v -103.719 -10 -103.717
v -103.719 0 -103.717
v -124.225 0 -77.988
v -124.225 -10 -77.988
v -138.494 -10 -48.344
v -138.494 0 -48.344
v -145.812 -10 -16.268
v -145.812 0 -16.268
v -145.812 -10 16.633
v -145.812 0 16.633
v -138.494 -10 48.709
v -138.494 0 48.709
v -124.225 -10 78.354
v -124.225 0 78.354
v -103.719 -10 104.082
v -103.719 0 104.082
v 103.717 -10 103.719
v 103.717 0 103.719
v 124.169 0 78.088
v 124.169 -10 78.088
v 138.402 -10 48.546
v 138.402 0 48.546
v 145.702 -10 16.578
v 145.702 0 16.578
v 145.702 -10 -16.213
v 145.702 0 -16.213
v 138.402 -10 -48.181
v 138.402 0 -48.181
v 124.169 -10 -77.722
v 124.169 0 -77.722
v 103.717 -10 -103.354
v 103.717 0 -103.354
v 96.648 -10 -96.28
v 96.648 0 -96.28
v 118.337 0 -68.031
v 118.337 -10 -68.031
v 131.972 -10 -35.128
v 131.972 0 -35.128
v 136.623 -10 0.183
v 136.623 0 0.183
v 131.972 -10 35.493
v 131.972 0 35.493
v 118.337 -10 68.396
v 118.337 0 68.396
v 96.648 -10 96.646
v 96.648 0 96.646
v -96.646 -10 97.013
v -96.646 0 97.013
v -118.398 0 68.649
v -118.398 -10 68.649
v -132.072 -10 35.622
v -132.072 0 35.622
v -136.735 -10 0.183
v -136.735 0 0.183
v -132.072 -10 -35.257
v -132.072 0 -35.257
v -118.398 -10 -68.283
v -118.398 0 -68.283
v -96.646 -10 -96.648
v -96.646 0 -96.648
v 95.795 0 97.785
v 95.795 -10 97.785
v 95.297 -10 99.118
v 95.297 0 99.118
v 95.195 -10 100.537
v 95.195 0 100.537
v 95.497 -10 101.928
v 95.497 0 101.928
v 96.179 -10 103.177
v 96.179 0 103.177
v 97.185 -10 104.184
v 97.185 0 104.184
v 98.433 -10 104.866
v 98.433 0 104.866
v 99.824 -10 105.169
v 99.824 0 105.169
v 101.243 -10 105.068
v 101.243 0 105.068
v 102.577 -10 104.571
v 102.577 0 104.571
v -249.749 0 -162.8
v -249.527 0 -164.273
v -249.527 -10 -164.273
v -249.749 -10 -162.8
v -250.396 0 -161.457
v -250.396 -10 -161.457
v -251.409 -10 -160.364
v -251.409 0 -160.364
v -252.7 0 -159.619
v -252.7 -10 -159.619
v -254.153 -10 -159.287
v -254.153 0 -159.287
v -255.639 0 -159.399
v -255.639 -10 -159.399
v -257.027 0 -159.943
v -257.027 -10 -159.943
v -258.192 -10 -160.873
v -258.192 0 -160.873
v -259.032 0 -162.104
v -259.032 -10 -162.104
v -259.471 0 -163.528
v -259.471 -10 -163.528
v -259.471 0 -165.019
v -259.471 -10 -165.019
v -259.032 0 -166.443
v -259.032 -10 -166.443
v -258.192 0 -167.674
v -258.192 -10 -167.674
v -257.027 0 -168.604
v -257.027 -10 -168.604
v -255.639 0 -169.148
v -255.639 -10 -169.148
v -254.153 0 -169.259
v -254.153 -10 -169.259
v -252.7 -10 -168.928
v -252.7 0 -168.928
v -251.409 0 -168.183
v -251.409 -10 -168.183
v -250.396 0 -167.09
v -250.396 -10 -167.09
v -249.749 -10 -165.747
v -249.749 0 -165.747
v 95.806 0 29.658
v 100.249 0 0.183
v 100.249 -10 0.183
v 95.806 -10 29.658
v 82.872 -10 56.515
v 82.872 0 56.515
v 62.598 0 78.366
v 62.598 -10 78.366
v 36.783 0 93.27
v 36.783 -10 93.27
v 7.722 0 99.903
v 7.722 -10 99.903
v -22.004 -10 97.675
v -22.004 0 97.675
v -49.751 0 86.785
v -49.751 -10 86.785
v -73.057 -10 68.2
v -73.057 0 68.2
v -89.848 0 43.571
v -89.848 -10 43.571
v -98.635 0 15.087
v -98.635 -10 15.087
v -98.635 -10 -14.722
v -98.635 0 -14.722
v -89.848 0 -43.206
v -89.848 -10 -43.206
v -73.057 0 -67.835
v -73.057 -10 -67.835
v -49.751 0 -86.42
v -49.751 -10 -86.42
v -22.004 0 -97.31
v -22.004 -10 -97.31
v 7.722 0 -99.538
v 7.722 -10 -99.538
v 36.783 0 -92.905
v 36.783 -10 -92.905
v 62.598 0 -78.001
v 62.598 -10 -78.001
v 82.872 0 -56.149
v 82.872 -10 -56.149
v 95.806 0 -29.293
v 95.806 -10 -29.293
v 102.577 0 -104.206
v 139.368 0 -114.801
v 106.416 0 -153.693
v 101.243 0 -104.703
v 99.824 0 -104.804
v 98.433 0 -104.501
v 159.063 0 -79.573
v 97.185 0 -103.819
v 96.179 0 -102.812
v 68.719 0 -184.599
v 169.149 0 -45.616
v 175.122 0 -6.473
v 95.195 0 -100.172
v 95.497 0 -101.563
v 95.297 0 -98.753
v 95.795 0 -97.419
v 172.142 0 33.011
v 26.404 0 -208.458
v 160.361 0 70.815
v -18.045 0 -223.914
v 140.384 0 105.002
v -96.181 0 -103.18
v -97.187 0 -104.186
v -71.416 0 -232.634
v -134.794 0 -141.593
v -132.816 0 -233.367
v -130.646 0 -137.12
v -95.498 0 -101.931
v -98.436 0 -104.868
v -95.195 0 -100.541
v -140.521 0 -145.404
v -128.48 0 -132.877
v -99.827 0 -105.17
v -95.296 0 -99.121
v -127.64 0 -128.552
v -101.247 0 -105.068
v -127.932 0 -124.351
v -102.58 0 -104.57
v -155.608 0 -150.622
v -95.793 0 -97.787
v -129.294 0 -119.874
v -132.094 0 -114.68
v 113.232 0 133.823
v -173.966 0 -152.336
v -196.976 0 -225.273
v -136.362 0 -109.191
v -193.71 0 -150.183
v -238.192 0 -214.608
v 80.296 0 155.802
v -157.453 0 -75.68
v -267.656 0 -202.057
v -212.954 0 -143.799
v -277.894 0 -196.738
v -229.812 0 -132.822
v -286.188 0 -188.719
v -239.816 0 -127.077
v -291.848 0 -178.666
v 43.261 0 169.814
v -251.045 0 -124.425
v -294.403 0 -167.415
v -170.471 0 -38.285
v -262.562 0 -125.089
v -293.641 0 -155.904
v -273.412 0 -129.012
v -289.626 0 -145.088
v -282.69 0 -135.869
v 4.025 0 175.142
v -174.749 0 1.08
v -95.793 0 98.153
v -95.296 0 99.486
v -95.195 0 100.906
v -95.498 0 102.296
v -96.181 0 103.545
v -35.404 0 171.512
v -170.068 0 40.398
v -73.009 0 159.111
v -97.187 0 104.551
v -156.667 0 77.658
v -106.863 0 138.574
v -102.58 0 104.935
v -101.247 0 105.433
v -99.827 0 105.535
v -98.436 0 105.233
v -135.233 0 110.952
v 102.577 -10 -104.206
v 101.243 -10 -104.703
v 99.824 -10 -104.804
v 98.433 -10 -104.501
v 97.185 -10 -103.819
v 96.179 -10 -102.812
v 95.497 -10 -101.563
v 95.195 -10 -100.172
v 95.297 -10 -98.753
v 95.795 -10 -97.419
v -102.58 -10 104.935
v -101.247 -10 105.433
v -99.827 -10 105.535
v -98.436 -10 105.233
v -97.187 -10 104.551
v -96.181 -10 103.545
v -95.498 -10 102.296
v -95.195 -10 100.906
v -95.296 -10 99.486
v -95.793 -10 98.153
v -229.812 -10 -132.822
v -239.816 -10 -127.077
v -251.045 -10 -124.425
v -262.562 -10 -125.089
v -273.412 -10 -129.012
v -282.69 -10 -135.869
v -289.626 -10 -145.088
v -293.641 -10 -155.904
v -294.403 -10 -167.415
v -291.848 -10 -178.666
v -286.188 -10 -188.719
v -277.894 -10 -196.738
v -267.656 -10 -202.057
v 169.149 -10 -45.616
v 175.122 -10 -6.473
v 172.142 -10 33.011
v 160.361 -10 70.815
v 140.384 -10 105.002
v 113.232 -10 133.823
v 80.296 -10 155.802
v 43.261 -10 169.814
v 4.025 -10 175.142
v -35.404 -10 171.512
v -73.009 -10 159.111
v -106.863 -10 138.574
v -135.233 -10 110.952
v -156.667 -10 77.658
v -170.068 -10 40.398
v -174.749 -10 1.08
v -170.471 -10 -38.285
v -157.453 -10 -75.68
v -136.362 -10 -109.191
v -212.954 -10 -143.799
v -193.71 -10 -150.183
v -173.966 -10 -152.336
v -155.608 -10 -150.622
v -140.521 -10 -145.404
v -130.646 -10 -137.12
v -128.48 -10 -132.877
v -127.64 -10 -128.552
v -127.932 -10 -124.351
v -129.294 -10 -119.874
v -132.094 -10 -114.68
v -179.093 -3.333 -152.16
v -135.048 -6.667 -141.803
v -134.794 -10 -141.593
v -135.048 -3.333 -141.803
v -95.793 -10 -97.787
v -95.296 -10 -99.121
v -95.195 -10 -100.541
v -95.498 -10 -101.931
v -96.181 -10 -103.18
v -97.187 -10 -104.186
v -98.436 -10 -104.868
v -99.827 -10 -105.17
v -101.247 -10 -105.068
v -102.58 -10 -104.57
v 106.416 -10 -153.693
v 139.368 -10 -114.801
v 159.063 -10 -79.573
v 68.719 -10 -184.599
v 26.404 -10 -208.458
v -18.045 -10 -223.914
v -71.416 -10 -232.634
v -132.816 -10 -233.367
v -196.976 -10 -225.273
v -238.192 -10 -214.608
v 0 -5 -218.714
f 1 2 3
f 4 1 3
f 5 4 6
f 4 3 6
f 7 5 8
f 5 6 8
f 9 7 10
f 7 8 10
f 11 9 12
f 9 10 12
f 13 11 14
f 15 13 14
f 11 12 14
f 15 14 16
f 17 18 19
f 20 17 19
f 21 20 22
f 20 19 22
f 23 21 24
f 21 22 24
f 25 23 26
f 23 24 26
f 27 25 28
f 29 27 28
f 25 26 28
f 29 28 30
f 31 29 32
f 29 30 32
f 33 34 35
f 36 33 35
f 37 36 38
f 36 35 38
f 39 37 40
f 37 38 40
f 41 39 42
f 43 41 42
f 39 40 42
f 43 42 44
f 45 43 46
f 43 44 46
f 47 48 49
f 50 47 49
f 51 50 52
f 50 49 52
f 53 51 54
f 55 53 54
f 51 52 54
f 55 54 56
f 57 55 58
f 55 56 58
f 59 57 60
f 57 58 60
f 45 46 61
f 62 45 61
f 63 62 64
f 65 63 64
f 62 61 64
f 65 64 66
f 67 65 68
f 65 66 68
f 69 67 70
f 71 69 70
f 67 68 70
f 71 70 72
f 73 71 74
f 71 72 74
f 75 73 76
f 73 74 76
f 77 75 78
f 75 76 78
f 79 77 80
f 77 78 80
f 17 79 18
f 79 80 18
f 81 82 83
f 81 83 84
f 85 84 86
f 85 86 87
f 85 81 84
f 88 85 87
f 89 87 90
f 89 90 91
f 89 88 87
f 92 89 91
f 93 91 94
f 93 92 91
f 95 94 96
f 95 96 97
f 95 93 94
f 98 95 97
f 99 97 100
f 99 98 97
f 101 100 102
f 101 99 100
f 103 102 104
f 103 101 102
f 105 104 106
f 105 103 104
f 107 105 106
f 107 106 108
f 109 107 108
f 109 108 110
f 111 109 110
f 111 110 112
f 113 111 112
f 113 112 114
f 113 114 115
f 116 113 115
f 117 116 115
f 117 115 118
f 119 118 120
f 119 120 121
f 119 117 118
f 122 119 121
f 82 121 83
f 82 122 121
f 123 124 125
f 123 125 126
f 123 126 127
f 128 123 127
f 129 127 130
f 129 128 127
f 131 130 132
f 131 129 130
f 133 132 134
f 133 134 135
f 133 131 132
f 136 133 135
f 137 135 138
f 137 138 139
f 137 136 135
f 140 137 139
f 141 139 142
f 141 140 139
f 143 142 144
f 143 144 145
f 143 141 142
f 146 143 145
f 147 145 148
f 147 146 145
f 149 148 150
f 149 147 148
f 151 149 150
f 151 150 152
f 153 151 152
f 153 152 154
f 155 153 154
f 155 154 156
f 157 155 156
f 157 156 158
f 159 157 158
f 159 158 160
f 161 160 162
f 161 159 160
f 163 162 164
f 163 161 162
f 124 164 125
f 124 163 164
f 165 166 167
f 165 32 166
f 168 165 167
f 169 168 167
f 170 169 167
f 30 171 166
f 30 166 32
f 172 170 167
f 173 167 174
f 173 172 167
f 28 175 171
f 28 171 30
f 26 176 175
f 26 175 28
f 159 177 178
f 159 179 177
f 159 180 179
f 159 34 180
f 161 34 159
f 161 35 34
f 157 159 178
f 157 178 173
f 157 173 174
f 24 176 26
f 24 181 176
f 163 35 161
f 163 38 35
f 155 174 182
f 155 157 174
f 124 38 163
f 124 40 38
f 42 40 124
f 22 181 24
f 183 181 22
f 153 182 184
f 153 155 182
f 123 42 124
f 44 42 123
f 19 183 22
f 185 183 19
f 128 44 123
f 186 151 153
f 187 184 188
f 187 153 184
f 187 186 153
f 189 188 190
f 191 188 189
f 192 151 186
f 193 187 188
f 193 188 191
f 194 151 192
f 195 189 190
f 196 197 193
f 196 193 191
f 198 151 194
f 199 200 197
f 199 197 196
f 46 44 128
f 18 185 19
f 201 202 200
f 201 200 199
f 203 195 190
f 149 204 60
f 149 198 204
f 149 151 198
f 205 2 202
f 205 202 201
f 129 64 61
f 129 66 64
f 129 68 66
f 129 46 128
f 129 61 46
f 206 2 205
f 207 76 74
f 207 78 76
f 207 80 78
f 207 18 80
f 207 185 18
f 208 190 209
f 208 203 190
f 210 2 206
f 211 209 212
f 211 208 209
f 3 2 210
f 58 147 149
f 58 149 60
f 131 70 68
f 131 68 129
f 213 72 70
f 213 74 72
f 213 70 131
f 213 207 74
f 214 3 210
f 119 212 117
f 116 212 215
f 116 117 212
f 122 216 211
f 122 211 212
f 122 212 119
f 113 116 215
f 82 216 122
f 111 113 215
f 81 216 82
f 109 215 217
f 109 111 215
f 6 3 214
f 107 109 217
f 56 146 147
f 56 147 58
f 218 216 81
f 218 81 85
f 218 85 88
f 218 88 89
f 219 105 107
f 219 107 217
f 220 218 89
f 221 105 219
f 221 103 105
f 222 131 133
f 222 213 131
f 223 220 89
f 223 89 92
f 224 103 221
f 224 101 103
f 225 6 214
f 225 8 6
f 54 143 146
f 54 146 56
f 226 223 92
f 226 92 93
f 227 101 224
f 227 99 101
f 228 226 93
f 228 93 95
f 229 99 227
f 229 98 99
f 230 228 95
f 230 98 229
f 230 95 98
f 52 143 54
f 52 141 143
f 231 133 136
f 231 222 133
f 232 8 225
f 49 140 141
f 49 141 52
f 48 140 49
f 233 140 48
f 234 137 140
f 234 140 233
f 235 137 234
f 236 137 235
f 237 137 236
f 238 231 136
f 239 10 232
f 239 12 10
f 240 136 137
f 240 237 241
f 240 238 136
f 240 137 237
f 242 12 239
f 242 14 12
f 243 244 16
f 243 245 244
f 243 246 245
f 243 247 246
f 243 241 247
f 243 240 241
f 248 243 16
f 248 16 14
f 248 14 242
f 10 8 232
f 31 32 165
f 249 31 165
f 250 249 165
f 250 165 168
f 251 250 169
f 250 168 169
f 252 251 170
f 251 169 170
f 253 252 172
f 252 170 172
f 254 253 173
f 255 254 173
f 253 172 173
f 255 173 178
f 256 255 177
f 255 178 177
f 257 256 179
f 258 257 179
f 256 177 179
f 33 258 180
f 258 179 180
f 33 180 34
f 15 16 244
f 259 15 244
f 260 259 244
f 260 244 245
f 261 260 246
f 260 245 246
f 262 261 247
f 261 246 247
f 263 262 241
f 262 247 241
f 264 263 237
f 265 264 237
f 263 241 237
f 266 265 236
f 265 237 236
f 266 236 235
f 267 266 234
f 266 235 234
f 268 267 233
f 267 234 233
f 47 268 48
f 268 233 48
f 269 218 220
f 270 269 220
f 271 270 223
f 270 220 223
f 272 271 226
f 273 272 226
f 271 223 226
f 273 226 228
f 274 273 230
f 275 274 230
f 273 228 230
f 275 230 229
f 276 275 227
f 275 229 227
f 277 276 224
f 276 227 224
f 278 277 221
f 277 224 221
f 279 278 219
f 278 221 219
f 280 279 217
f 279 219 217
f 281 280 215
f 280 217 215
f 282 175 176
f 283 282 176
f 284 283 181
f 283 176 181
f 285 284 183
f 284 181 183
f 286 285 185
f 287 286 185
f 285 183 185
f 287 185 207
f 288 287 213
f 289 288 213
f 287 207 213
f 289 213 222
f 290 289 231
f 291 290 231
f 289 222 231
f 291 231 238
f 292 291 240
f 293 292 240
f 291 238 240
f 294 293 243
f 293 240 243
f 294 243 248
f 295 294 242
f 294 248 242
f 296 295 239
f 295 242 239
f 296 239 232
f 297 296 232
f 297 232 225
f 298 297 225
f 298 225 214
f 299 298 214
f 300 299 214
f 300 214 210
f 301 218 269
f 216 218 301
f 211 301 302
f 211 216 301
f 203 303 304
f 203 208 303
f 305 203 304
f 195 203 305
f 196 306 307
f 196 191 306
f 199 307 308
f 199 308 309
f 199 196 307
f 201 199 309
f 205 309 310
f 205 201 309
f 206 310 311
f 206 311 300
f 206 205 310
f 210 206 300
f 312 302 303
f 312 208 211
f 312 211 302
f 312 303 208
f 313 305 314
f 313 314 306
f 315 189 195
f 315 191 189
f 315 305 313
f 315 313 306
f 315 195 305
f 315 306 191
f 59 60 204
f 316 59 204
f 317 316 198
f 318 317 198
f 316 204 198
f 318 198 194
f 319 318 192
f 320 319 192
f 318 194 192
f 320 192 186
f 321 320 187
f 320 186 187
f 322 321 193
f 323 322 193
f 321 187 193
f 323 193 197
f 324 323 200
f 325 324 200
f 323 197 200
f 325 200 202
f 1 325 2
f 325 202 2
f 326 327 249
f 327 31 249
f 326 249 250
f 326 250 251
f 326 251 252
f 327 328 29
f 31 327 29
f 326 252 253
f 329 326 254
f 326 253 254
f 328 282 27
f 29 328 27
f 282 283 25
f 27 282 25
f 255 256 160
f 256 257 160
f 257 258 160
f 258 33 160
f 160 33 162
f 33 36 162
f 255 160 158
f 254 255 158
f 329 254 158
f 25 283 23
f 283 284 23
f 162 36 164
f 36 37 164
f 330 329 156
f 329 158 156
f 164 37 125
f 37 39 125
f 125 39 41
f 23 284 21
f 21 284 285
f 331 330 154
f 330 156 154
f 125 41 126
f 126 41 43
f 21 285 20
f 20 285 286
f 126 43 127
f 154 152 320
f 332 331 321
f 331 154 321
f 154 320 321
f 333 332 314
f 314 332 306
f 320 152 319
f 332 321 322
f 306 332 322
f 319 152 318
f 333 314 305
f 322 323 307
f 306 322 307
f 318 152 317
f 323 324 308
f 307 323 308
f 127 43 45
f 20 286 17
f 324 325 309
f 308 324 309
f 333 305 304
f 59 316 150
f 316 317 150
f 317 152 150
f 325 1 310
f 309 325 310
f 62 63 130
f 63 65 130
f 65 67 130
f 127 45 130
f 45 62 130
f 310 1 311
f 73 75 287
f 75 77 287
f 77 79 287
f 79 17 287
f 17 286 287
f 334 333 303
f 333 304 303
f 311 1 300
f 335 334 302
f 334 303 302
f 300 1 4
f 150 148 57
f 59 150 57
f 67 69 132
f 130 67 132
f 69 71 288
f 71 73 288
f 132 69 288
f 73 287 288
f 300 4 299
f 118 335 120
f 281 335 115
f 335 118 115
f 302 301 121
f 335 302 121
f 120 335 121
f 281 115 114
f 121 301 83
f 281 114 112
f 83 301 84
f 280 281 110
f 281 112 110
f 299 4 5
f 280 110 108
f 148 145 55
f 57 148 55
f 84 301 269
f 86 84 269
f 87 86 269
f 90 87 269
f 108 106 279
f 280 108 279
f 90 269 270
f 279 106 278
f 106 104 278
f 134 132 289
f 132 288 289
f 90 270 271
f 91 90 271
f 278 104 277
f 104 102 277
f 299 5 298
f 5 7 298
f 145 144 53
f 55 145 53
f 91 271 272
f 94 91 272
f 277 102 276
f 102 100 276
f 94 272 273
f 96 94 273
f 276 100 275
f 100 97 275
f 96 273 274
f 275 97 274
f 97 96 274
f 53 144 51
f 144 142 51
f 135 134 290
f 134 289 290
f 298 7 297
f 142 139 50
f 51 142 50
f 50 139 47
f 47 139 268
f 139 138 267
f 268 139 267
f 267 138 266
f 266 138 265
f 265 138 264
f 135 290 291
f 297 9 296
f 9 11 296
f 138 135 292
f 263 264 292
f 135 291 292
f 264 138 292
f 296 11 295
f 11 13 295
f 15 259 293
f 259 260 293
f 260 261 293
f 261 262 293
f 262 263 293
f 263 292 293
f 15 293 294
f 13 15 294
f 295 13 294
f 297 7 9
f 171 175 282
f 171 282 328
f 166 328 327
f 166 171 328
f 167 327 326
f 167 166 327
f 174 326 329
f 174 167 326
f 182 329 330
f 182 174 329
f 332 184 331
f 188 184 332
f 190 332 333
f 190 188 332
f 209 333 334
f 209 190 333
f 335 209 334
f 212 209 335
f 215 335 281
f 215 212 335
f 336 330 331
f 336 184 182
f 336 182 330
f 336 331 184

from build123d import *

# Parameters (mm, degrees)
F0_R     = 5
F0_R_2   = 100
F1_DEPTH = 10


# Not quite as in the source:
# - ends of sketch curves that miss each other by under 0.0002 mm in the source are joined


with BuildPart() as f1:
    # F0 (on Front) → F1 (new body)
    with BuildSketch(Plane.XZ):
        with BuildLine():
            add(Edge.make_bspline(
                [(169.1493929479, -45.6158926146), (159.7651292122, -107.4219847214), (22.7183427382, -273.4801182779), (-224.8579575674, -226.7328438), (-267.6564696794, -202.0572125126)],
                knots=[0, 0, 0, 0, 0.4871765071, 1, 1, 1, 1], degree=3))
            ThreePointArc((169.1493929479, -45.6158926146), (-35.404456431, 171.5122555076), (-136.3616027906, -109.1914398753))
            add(Edge.make_bspline(
                [(-229.8119745952, -132.8222825671), (-188.6496121839, -169.4869168537), (-99.4743329729, -150.4504772299), (-136.3616027906, -109.1914398753)],
                knots=[0, 0, 0, 0, 96.391849846, 96.391849846, 96.391849846, 96.391849846], degree=3))
            ThreePointArc((-229.8119745952, -132.8222825671), (-289.6255876831, -145.0881241092), (-267.6564696794, -202.0572125126))
        make_face()
        with Locations((-254.5268251568, -164.2734536378)):
            Circle(F0_R, mode=Mode.SUBTRACT)
        with BuildLine():
            ThreePointArc((-96.6455557461, 97.0129985964), (-136.73540255, 0.1825598604), (-96.6455557461, -96.6478788756))
            ThreePointArc((-96.6455557461, -96.6478788756), (-96.6478779601, -103.7189453909), (-103.7189453903, -103.7166222615))
            ThreePointArc((-103.7189453903, -103.7166222615), (-146.7353999615, 0.1825598604), (-103.7189444749, 104.0817410675))
            ThreePointArc((-103.7189444749, 104.0817410675), (-96.6478779601, 104.0840651118), (-96.6455557461, 97.0129985964))
        make_face(mode=Mode.SUBTRACT)
        with Locations((0.2485292707, 0.1825598604)):
            Circle(F0_R_2, mode=Mode.SUBTRACT)
        with BuildLine():
            ThreePointArc((96.6478838863, -96.2804310179), (136.6228090286, 0.1825598604), (96.6478838863, 96.6455507387))
            ThreePointArc((96.6478838863, 96.6455507387), (96.6455499466, 103.7166173731), (103.7166173736, 103.7189505206))
            ThreePointArc((103.7166173736, 103.7189505206), (146.6228067875, 0.1825598604), (103.7166165815, -103.3538300071))
            ThreePointArc((103.7166165815, -103.3538300071), (96.6455499466, -103.3514976522), (96.6478838863, -96.2804310179))
        make_face(mode=Mode.SUBTRACT)
    extrude(amount=F1_DEPTH)


solid = f1.part
